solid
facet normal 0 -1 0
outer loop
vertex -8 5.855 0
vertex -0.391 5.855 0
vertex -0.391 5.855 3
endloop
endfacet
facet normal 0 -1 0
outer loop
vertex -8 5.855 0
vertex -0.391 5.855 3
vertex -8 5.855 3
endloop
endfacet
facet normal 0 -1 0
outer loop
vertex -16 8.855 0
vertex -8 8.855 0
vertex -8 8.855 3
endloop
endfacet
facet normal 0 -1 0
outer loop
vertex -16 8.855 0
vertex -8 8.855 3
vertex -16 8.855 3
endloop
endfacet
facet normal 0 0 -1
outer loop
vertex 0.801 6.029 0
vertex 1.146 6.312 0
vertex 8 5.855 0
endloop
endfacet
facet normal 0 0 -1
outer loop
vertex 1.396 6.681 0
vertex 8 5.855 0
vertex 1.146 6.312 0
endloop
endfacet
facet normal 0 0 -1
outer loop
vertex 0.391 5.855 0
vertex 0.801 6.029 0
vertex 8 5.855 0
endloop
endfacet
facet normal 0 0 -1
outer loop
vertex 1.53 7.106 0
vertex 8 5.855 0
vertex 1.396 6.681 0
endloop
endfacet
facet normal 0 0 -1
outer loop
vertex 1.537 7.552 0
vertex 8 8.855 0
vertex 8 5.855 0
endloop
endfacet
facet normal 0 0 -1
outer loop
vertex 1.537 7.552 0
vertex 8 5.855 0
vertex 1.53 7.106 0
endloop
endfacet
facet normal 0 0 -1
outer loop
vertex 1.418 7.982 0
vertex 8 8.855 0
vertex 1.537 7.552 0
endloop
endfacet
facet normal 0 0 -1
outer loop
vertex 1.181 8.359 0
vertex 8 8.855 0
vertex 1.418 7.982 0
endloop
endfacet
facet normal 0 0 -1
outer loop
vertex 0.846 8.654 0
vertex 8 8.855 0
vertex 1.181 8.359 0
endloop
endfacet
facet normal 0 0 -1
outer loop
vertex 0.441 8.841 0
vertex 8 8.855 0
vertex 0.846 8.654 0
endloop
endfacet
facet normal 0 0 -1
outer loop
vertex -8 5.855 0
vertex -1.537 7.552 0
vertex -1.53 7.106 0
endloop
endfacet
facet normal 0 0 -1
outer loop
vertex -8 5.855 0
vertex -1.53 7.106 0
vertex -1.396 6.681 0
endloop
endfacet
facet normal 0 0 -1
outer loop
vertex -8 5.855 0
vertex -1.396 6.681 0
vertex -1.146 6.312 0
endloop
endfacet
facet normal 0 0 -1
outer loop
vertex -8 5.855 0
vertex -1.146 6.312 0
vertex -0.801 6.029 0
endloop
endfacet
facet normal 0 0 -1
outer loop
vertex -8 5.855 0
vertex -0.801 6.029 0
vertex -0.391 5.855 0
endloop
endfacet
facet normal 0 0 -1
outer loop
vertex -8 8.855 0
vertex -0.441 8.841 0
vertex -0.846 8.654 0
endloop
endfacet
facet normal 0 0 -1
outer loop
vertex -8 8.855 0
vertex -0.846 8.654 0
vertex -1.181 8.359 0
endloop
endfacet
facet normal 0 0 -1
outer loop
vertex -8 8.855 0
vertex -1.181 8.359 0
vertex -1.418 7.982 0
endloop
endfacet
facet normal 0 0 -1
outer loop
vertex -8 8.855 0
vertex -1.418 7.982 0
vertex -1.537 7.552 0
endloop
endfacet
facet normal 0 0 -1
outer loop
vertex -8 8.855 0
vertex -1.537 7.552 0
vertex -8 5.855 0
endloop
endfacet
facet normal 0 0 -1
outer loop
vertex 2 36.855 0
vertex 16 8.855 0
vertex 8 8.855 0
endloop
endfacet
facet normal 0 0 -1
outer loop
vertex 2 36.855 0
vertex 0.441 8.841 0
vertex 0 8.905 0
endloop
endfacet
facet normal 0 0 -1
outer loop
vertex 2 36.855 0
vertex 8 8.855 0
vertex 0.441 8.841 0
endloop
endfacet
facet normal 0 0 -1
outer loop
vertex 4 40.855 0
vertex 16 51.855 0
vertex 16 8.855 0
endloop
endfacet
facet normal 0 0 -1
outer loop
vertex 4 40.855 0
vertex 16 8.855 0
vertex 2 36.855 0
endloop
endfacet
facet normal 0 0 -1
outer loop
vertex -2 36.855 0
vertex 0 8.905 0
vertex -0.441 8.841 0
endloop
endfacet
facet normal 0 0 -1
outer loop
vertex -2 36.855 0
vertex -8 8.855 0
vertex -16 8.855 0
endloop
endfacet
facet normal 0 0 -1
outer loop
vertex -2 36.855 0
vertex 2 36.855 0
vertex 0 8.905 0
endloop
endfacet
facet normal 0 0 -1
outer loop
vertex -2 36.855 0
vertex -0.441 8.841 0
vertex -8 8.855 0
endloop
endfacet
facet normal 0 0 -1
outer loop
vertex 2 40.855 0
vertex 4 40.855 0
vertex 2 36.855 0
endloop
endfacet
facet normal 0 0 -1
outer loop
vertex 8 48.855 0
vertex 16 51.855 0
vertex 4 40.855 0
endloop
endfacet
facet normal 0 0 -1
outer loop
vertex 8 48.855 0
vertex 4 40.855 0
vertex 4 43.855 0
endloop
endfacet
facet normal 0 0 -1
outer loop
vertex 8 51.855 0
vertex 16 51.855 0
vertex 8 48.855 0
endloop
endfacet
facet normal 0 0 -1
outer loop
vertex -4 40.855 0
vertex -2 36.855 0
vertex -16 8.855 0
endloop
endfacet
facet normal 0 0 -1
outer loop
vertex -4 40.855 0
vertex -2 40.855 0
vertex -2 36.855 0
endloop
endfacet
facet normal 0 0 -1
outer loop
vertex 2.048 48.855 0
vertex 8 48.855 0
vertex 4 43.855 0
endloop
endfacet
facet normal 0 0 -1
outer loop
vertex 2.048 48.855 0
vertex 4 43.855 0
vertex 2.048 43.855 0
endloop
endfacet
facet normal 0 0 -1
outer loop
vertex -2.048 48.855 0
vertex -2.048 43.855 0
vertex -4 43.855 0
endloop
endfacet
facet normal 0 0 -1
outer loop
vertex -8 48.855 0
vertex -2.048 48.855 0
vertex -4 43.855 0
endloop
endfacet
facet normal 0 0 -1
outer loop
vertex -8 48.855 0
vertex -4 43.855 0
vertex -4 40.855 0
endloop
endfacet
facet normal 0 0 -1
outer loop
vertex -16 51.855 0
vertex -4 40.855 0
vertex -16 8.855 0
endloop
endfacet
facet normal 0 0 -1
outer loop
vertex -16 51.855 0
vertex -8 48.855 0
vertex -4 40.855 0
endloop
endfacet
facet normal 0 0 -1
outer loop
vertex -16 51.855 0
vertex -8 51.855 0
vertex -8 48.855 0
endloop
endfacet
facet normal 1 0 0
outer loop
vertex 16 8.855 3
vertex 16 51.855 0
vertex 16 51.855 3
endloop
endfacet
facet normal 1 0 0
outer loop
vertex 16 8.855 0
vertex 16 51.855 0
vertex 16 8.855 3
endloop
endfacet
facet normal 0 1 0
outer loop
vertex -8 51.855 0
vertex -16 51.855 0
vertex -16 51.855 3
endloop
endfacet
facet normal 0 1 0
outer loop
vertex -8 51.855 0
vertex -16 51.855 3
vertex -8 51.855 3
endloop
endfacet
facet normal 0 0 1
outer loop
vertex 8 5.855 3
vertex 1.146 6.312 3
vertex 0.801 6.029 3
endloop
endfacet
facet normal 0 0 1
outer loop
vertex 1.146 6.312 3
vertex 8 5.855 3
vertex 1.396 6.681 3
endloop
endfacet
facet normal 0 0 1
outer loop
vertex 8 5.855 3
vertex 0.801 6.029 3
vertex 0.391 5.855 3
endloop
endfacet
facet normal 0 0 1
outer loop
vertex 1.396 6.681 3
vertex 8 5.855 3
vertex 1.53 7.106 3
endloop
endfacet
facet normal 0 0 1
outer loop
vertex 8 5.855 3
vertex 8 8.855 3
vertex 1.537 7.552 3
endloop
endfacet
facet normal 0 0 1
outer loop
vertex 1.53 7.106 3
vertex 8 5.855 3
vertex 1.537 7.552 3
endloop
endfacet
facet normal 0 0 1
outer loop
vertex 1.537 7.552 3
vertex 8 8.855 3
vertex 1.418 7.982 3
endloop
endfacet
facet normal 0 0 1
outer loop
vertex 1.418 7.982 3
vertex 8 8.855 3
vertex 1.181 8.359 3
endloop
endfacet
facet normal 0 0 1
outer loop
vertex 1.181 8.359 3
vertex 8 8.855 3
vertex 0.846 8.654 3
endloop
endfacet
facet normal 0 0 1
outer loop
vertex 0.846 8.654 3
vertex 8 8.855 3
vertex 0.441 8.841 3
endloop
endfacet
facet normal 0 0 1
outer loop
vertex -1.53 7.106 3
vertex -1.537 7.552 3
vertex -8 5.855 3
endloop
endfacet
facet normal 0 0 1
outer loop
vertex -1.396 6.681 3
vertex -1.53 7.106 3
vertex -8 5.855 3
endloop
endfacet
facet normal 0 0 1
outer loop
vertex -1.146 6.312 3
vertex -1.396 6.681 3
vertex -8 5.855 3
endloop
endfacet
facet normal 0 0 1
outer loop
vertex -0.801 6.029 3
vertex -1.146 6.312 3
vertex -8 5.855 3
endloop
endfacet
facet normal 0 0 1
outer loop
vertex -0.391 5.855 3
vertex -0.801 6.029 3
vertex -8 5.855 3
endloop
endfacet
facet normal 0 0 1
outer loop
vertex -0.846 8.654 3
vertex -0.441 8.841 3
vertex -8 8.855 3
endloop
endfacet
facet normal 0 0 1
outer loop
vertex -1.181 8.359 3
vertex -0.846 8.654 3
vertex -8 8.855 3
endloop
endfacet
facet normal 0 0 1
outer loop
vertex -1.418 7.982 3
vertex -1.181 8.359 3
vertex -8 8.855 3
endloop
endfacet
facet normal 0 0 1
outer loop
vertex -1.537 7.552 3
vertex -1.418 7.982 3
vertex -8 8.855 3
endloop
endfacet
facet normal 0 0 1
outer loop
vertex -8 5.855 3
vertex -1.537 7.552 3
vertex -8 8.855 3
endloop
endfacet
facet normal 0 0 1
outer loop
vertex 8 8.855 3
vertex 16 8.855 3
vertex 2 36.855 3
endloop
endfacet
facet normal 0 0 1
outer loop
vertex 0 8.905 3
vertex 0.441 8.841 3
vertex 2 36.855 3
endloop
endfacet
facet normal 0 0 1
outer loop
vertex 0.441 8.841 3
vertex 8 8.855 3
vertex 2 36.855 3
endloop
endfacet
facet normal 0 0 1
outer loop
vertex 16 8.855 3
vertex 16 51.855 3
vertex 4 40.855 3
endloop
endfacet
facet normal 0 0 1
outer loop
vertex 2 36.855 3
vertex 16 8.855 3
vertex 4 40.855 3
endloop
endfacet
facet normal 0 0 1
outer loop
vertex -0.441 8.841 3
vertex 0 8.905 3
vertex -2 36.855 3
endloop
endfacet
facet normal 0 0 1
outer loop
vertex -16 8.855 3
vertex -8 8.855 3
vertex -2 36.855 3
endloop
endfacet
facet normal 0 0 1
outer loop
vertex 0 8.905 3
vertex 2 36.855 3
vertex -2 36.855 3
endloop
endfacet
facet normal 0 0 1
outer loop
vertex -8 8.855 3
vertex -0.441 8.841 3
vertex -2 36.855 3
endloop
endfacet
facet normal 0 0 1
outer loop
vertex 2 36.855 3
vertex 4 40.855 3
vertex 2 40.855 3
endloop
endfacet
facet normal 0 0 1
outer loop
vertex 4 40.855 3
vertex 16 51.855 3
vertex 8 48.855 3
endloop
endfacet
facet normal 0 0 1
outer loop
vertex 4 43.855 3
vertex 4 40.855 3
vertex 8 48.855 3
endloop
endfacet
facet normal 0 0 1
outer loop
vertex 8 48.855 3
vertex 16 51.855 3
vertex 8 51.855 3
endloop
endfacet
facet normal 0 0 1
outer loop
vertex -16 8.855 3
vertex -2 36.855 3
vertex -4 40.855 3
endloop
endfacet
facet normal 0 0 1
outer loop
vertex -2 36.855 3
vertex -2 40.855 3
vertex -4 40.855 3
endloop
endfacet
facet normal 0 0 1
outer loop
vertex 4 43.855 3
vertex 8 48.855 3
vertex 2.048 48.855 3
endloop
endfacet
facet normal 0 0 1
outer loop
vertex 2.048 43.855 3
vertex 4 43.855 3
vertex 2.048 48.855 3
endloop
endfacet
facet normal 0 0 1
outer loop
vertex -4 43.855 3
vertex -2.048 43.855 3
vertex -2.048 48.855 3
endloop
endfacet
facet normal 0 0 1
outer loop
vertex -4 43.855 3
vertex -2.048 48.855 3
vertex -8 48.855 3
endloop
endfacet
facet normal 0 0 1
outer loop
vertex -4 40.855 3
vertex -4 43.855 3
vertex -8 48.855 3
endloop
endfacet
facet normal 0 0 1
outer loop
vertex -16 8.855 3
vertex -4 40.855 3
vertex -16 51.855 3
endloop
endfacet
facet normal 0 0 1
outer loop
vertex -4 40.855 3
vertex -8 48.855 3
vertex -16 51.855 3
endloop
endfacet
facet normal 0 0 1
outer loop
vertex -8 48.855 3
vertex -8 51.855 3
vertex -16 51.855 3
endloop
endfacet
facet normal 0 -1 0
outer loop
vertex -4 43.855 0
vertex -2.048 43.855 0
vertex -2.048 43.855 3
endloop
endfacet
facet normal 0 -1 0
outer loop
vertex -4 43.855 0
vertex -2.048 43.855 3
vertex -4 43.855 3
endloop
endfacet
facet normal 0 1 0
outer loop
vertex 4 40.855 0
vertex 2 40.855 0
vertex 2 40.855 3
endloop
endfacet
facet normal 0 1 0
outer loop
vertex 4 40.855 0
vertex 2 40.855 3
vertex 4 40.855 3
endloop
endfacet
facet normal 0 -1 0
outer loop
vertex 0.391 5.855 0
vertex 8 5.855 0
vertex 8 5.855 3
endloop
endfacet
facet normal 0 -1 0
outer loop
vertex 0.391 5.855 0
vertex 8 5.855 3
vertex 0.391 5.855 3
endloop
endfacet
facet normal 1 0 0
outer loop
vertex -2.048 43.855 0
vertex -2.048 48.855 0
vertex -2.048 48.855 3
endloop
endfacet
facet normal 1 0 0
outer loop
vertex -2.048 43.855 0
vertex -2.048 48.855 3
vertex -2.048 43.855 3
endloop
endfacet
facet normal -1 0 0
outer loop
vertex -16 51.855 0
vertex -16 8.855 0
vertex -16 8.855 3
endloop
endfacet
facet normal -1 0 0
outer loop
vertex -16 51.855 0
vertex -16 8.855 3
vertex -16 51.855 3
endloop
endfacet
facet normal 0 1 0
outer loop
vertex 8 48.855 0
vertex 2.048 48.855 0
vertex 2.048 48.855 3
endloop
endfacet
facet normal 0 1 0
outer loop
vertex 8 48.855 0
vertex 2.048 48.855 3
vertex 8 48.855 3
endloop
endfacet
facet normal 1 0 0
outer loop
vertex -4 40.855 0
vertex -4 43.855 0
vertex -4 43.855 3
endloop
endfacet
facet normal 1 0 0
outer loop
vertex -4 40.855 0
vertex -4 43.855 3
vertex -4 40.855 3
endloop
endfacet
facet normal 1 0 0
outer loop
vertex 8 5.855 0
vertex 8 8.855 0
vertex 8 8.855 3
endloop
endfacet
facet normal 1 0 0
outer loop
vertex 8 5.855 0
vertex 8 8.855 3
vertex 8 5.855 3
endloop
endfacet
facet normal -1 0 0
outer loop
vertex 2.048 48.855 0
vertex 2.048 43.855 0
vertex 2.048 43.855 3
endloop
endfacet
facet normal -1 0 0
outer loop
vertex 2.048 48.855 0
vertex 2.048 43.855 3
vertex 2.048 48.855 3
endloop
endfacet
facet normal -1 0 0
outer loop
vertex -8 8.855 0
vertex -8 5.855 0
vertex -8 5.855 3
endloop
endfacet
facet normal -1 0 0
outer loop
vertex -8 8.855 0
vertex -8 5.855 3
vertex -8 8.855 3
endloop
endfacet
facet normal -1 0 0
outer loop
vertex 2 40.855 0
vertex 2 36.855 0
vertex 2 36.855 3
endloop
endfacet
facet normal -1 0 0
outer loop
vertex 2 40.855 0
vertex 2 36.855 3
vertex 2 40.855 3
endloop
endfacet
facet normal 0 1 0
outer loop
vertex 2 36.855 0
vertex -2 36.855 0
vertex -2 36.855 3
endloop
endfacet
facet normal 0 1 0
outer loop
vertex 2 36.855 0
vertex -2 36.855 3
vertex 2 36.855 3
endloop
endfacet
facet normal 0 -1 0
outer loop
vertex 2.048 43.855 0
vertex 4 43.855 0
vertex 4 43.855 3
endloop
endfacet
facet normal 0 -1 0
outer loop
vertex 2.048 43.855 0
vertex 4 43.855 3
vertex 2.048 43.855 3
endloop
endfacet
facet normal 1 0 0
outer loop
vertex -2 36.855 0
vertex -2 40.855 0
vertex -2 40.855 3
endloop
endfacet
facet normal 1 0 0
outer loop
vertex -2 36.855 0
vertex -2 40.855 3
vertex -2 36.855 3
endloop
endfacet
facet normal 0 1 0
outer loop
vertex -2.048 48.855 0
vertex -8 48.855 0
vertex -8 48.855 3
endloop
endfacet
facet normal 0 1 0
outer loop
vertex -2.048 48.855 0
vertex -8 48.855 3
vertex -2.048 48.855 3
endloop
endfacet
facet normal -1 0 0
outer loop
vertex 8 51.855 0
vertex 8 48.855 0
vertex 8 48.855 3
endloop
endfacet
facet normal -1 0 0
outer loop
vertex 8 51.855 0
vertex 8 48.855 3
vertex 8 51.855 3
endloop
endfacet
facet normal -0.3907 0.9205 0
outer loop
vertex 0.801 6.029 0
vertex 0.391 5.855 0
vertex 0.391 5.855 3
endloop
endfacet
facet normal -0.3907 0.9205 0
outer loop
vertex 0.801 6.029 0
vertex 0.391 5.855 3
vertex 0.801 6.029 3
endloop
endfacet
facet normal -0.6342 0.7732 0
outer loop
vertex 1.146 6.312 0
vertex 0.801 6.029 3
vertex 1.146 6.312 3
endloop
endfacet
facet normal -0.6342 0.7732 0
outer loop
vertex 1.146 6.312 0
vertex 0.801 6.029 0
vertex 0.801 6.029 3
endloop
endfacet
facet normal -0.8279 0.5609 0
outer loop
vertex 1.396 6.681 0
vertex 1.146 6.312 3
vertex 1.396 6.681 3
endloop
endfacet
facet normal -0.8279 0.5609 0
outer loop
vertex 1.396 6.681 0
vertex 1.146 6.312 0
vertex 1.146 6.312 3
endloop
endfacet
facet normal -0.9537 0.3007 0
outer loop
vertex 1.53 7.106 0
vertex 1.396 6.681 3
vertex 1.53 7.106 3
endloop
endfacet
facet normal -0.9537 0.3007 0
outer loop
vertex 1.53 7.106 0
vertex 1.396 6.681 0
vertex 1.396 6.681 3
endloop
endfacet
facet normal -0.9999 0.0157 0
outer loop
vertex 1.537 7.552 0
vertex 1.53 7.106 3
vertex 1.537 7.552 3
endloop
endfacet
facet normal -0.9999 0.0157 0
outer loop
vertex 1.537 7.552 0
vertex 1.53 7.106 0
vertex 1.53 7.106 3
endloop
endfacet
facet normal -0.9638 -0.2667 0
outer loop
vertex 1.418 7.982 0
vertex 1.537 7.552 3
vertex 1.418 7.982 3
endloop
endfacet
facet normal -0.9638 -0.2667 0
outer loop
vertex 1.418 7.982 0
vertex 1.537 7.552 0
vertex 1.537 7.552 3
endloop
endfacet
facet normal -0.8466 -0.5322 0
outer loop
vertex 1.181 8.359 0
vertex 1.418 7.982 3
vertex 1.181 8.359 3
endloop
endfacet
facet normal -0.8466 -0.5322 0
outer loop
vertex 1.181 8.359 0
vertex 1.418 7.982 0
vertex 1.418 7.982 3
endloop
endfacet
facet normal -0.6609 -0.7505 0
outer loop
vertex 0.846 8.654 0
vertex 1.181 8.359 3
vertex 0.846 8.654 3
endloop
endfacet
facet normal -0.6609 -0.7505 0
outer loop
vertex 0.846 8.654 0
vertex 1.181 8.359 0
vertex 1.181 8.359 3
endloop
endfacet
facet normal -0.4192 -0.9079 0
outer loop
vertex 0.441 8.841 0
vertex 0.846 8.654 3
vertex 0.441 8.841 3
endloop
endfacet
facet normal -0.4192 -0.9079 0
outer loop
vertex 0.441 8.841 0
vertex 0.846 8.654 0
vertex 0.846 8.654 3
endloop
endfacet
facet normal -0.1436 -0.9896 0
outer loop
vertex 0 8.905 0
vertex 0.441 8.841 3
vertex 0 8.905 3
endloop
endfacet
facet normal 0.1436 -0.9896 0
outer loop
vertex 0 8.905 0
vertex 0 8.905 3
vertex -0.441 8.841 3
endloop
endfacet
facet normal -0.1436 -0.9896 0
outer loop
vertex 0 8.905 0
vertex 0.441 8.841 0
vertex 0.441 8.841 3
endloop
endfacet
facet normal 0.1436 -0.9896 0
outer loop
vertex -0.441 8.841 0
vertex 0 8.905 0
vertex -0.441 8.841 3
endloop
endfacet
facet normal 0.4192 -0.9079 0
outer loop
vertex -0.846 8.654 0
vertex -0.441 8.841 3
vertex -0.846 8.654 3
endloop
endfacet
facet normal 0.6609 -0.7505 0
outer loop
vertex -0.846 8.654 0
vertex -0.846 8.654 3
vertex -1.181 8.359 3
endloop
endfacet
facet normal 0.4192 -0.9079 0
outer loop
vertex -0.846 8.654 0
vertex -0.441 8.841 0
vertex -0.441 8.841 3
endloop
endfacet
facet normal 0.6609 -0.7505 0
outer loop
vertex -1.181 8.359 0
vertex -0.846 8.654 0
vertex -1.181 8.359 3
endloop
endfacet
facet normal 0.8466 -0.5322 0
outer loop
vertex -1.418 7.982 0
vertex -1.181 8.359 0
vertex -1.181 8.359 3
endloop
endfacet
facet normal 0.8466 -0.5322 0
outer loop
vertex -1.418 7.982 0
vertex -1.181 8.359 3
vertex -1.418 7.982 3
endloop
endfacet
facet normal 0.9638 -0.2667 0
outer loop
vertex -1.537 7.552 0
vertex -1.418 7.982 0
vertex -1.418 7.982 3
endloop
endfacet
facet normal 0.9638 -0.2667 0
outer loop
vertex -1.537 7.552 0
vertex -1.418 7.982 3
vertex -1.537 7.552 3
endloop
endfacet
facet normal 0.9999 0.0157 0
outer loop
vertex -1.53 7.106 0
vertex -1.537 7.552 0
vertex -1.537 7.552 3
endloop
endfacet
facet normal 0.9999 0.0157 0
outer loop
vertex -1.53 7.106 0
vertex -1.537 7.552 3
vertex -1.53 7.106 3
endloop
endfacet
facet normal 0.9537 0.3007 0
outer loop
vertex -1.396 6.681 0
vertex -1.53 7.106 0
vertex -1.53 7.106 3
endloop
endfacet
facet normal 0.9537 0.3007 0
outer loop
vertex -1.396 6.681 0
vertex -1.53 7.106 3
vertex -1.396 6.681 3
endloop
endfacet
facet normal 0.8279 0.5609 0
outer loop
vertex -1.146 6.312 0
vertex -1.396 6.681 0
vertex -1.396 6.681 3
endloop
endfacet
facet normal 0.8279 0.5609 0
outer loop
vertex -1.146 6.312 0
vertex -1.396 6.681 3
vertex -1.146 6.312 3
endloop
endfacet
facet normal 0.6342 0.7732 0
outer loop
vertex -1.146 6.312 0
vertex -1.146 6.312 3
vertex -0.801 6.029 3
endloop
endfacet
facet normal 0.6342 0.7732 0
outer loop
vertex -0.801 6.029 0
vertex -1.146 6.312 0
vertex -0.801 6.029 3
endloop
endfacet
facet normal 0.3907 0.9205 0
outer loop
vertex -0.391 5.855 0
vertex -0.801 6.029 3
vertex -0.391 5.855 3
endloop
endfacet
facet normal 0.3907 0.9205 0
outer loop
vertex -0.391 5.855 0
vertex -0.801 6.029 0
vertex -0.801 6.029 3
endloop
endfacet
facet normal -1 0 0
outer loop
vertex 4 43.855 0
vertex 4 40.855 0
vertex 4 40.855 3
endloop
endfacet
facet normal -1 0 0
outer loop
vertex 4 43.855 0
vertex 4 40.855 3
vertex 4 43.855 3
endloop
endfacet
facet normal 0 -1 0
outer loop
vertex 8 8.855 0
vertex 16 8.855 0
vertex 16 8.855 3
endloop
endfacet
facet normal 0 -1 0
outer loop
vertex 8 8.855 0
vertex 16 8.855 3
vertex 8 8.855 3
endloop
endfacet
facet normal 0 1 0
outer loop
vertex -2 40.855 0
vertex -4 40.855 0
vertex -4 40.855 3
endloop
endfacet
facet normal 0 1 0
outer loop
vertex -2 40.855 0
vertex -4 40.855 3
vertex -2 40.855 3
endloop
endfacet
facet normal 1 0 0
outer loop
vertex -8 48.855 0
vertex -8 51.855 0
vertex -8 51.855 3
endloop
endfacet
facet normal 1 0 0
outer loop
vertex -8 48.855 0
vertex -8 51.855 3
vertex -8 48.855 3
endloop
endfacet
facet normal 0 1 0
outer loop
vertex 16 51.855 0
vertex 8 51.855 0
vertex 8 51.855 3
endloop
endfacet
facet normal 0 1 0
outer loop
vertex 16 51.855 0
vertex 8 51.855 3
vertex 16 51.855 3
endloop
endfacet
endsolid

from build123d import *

# Parameters (mm, degrees)
EXTRUDE_1_DEPTH = 3


with BuildPart() as part:
    # 草图2 → 凸台-拉伸1 (new body)
    with BuildSketch(Plane.XY):
        with BuildLine():
            Line((2.047890023, 48.855305477), (8, 48.855305477))
            Line((8, 48.855305477), (8, 51.855305477))
            Line((8, 51.855305477), (16, 51.855305477))
            Line((16, 51.855305477), (16, 8.855305477))
            Line((16, 8.855305477), (8, 8.855305477))
            Line((8, 8.855305477), (8, 5.855305477))
            Line((8, 5.855305477), (0.390512484, 5.855305477))
            ThreePointArc((0.390512484, 5.855305477), (0, 8.905305477), (-0.390512484, 5.855305477))
            Line((-0.390512484, 5.855305477), (-8, 5.855305477))
            Line((-8, 5.855305477), (-8, 8.855305477))
            Line((-8, 8.855305477), (-16, 8.855305477))
            Line((-16, 8.855305477), (-16, 51.855305477))
            Line((-16, 51.855305477), (-8, 51.855305477))
            Line((-8, 51.855305477), (-8, 48.855305477))
            Line((-8, 48.855305477), (-2.047890023, 48.855305477))
            Line((-2.047890023, 48.855305477), (-2.047890023, 43.855305477))
            Line((-2.047890023, 43.855305477), (-4, 43.855305477))
            Line((-4, 43.855305477), (-4, 40.855305477))
            Line((-4, 40.855305477), (-2, 40.855305477))
            Line((-2, 40.855305477), (-2, 36.855305477))
            Line((-2, 36.855305477), (2, 36.855305477))
            Line((2, 36.855305477), (2, 40.855305477))
            Line((2, 40.855305477), (4, 40.855305477))
            Line((4, 40.855305477), (4, 43.855305477))
            Line((4, 43.855305477), (2.047890023, 43.855305477))
            Line((2.047890023, 43.855305477), (2.047890023, 48.855305477))
        make_face()
    extrude(amount=EXTRUDE_1_DEPTH)


solid = part.part
